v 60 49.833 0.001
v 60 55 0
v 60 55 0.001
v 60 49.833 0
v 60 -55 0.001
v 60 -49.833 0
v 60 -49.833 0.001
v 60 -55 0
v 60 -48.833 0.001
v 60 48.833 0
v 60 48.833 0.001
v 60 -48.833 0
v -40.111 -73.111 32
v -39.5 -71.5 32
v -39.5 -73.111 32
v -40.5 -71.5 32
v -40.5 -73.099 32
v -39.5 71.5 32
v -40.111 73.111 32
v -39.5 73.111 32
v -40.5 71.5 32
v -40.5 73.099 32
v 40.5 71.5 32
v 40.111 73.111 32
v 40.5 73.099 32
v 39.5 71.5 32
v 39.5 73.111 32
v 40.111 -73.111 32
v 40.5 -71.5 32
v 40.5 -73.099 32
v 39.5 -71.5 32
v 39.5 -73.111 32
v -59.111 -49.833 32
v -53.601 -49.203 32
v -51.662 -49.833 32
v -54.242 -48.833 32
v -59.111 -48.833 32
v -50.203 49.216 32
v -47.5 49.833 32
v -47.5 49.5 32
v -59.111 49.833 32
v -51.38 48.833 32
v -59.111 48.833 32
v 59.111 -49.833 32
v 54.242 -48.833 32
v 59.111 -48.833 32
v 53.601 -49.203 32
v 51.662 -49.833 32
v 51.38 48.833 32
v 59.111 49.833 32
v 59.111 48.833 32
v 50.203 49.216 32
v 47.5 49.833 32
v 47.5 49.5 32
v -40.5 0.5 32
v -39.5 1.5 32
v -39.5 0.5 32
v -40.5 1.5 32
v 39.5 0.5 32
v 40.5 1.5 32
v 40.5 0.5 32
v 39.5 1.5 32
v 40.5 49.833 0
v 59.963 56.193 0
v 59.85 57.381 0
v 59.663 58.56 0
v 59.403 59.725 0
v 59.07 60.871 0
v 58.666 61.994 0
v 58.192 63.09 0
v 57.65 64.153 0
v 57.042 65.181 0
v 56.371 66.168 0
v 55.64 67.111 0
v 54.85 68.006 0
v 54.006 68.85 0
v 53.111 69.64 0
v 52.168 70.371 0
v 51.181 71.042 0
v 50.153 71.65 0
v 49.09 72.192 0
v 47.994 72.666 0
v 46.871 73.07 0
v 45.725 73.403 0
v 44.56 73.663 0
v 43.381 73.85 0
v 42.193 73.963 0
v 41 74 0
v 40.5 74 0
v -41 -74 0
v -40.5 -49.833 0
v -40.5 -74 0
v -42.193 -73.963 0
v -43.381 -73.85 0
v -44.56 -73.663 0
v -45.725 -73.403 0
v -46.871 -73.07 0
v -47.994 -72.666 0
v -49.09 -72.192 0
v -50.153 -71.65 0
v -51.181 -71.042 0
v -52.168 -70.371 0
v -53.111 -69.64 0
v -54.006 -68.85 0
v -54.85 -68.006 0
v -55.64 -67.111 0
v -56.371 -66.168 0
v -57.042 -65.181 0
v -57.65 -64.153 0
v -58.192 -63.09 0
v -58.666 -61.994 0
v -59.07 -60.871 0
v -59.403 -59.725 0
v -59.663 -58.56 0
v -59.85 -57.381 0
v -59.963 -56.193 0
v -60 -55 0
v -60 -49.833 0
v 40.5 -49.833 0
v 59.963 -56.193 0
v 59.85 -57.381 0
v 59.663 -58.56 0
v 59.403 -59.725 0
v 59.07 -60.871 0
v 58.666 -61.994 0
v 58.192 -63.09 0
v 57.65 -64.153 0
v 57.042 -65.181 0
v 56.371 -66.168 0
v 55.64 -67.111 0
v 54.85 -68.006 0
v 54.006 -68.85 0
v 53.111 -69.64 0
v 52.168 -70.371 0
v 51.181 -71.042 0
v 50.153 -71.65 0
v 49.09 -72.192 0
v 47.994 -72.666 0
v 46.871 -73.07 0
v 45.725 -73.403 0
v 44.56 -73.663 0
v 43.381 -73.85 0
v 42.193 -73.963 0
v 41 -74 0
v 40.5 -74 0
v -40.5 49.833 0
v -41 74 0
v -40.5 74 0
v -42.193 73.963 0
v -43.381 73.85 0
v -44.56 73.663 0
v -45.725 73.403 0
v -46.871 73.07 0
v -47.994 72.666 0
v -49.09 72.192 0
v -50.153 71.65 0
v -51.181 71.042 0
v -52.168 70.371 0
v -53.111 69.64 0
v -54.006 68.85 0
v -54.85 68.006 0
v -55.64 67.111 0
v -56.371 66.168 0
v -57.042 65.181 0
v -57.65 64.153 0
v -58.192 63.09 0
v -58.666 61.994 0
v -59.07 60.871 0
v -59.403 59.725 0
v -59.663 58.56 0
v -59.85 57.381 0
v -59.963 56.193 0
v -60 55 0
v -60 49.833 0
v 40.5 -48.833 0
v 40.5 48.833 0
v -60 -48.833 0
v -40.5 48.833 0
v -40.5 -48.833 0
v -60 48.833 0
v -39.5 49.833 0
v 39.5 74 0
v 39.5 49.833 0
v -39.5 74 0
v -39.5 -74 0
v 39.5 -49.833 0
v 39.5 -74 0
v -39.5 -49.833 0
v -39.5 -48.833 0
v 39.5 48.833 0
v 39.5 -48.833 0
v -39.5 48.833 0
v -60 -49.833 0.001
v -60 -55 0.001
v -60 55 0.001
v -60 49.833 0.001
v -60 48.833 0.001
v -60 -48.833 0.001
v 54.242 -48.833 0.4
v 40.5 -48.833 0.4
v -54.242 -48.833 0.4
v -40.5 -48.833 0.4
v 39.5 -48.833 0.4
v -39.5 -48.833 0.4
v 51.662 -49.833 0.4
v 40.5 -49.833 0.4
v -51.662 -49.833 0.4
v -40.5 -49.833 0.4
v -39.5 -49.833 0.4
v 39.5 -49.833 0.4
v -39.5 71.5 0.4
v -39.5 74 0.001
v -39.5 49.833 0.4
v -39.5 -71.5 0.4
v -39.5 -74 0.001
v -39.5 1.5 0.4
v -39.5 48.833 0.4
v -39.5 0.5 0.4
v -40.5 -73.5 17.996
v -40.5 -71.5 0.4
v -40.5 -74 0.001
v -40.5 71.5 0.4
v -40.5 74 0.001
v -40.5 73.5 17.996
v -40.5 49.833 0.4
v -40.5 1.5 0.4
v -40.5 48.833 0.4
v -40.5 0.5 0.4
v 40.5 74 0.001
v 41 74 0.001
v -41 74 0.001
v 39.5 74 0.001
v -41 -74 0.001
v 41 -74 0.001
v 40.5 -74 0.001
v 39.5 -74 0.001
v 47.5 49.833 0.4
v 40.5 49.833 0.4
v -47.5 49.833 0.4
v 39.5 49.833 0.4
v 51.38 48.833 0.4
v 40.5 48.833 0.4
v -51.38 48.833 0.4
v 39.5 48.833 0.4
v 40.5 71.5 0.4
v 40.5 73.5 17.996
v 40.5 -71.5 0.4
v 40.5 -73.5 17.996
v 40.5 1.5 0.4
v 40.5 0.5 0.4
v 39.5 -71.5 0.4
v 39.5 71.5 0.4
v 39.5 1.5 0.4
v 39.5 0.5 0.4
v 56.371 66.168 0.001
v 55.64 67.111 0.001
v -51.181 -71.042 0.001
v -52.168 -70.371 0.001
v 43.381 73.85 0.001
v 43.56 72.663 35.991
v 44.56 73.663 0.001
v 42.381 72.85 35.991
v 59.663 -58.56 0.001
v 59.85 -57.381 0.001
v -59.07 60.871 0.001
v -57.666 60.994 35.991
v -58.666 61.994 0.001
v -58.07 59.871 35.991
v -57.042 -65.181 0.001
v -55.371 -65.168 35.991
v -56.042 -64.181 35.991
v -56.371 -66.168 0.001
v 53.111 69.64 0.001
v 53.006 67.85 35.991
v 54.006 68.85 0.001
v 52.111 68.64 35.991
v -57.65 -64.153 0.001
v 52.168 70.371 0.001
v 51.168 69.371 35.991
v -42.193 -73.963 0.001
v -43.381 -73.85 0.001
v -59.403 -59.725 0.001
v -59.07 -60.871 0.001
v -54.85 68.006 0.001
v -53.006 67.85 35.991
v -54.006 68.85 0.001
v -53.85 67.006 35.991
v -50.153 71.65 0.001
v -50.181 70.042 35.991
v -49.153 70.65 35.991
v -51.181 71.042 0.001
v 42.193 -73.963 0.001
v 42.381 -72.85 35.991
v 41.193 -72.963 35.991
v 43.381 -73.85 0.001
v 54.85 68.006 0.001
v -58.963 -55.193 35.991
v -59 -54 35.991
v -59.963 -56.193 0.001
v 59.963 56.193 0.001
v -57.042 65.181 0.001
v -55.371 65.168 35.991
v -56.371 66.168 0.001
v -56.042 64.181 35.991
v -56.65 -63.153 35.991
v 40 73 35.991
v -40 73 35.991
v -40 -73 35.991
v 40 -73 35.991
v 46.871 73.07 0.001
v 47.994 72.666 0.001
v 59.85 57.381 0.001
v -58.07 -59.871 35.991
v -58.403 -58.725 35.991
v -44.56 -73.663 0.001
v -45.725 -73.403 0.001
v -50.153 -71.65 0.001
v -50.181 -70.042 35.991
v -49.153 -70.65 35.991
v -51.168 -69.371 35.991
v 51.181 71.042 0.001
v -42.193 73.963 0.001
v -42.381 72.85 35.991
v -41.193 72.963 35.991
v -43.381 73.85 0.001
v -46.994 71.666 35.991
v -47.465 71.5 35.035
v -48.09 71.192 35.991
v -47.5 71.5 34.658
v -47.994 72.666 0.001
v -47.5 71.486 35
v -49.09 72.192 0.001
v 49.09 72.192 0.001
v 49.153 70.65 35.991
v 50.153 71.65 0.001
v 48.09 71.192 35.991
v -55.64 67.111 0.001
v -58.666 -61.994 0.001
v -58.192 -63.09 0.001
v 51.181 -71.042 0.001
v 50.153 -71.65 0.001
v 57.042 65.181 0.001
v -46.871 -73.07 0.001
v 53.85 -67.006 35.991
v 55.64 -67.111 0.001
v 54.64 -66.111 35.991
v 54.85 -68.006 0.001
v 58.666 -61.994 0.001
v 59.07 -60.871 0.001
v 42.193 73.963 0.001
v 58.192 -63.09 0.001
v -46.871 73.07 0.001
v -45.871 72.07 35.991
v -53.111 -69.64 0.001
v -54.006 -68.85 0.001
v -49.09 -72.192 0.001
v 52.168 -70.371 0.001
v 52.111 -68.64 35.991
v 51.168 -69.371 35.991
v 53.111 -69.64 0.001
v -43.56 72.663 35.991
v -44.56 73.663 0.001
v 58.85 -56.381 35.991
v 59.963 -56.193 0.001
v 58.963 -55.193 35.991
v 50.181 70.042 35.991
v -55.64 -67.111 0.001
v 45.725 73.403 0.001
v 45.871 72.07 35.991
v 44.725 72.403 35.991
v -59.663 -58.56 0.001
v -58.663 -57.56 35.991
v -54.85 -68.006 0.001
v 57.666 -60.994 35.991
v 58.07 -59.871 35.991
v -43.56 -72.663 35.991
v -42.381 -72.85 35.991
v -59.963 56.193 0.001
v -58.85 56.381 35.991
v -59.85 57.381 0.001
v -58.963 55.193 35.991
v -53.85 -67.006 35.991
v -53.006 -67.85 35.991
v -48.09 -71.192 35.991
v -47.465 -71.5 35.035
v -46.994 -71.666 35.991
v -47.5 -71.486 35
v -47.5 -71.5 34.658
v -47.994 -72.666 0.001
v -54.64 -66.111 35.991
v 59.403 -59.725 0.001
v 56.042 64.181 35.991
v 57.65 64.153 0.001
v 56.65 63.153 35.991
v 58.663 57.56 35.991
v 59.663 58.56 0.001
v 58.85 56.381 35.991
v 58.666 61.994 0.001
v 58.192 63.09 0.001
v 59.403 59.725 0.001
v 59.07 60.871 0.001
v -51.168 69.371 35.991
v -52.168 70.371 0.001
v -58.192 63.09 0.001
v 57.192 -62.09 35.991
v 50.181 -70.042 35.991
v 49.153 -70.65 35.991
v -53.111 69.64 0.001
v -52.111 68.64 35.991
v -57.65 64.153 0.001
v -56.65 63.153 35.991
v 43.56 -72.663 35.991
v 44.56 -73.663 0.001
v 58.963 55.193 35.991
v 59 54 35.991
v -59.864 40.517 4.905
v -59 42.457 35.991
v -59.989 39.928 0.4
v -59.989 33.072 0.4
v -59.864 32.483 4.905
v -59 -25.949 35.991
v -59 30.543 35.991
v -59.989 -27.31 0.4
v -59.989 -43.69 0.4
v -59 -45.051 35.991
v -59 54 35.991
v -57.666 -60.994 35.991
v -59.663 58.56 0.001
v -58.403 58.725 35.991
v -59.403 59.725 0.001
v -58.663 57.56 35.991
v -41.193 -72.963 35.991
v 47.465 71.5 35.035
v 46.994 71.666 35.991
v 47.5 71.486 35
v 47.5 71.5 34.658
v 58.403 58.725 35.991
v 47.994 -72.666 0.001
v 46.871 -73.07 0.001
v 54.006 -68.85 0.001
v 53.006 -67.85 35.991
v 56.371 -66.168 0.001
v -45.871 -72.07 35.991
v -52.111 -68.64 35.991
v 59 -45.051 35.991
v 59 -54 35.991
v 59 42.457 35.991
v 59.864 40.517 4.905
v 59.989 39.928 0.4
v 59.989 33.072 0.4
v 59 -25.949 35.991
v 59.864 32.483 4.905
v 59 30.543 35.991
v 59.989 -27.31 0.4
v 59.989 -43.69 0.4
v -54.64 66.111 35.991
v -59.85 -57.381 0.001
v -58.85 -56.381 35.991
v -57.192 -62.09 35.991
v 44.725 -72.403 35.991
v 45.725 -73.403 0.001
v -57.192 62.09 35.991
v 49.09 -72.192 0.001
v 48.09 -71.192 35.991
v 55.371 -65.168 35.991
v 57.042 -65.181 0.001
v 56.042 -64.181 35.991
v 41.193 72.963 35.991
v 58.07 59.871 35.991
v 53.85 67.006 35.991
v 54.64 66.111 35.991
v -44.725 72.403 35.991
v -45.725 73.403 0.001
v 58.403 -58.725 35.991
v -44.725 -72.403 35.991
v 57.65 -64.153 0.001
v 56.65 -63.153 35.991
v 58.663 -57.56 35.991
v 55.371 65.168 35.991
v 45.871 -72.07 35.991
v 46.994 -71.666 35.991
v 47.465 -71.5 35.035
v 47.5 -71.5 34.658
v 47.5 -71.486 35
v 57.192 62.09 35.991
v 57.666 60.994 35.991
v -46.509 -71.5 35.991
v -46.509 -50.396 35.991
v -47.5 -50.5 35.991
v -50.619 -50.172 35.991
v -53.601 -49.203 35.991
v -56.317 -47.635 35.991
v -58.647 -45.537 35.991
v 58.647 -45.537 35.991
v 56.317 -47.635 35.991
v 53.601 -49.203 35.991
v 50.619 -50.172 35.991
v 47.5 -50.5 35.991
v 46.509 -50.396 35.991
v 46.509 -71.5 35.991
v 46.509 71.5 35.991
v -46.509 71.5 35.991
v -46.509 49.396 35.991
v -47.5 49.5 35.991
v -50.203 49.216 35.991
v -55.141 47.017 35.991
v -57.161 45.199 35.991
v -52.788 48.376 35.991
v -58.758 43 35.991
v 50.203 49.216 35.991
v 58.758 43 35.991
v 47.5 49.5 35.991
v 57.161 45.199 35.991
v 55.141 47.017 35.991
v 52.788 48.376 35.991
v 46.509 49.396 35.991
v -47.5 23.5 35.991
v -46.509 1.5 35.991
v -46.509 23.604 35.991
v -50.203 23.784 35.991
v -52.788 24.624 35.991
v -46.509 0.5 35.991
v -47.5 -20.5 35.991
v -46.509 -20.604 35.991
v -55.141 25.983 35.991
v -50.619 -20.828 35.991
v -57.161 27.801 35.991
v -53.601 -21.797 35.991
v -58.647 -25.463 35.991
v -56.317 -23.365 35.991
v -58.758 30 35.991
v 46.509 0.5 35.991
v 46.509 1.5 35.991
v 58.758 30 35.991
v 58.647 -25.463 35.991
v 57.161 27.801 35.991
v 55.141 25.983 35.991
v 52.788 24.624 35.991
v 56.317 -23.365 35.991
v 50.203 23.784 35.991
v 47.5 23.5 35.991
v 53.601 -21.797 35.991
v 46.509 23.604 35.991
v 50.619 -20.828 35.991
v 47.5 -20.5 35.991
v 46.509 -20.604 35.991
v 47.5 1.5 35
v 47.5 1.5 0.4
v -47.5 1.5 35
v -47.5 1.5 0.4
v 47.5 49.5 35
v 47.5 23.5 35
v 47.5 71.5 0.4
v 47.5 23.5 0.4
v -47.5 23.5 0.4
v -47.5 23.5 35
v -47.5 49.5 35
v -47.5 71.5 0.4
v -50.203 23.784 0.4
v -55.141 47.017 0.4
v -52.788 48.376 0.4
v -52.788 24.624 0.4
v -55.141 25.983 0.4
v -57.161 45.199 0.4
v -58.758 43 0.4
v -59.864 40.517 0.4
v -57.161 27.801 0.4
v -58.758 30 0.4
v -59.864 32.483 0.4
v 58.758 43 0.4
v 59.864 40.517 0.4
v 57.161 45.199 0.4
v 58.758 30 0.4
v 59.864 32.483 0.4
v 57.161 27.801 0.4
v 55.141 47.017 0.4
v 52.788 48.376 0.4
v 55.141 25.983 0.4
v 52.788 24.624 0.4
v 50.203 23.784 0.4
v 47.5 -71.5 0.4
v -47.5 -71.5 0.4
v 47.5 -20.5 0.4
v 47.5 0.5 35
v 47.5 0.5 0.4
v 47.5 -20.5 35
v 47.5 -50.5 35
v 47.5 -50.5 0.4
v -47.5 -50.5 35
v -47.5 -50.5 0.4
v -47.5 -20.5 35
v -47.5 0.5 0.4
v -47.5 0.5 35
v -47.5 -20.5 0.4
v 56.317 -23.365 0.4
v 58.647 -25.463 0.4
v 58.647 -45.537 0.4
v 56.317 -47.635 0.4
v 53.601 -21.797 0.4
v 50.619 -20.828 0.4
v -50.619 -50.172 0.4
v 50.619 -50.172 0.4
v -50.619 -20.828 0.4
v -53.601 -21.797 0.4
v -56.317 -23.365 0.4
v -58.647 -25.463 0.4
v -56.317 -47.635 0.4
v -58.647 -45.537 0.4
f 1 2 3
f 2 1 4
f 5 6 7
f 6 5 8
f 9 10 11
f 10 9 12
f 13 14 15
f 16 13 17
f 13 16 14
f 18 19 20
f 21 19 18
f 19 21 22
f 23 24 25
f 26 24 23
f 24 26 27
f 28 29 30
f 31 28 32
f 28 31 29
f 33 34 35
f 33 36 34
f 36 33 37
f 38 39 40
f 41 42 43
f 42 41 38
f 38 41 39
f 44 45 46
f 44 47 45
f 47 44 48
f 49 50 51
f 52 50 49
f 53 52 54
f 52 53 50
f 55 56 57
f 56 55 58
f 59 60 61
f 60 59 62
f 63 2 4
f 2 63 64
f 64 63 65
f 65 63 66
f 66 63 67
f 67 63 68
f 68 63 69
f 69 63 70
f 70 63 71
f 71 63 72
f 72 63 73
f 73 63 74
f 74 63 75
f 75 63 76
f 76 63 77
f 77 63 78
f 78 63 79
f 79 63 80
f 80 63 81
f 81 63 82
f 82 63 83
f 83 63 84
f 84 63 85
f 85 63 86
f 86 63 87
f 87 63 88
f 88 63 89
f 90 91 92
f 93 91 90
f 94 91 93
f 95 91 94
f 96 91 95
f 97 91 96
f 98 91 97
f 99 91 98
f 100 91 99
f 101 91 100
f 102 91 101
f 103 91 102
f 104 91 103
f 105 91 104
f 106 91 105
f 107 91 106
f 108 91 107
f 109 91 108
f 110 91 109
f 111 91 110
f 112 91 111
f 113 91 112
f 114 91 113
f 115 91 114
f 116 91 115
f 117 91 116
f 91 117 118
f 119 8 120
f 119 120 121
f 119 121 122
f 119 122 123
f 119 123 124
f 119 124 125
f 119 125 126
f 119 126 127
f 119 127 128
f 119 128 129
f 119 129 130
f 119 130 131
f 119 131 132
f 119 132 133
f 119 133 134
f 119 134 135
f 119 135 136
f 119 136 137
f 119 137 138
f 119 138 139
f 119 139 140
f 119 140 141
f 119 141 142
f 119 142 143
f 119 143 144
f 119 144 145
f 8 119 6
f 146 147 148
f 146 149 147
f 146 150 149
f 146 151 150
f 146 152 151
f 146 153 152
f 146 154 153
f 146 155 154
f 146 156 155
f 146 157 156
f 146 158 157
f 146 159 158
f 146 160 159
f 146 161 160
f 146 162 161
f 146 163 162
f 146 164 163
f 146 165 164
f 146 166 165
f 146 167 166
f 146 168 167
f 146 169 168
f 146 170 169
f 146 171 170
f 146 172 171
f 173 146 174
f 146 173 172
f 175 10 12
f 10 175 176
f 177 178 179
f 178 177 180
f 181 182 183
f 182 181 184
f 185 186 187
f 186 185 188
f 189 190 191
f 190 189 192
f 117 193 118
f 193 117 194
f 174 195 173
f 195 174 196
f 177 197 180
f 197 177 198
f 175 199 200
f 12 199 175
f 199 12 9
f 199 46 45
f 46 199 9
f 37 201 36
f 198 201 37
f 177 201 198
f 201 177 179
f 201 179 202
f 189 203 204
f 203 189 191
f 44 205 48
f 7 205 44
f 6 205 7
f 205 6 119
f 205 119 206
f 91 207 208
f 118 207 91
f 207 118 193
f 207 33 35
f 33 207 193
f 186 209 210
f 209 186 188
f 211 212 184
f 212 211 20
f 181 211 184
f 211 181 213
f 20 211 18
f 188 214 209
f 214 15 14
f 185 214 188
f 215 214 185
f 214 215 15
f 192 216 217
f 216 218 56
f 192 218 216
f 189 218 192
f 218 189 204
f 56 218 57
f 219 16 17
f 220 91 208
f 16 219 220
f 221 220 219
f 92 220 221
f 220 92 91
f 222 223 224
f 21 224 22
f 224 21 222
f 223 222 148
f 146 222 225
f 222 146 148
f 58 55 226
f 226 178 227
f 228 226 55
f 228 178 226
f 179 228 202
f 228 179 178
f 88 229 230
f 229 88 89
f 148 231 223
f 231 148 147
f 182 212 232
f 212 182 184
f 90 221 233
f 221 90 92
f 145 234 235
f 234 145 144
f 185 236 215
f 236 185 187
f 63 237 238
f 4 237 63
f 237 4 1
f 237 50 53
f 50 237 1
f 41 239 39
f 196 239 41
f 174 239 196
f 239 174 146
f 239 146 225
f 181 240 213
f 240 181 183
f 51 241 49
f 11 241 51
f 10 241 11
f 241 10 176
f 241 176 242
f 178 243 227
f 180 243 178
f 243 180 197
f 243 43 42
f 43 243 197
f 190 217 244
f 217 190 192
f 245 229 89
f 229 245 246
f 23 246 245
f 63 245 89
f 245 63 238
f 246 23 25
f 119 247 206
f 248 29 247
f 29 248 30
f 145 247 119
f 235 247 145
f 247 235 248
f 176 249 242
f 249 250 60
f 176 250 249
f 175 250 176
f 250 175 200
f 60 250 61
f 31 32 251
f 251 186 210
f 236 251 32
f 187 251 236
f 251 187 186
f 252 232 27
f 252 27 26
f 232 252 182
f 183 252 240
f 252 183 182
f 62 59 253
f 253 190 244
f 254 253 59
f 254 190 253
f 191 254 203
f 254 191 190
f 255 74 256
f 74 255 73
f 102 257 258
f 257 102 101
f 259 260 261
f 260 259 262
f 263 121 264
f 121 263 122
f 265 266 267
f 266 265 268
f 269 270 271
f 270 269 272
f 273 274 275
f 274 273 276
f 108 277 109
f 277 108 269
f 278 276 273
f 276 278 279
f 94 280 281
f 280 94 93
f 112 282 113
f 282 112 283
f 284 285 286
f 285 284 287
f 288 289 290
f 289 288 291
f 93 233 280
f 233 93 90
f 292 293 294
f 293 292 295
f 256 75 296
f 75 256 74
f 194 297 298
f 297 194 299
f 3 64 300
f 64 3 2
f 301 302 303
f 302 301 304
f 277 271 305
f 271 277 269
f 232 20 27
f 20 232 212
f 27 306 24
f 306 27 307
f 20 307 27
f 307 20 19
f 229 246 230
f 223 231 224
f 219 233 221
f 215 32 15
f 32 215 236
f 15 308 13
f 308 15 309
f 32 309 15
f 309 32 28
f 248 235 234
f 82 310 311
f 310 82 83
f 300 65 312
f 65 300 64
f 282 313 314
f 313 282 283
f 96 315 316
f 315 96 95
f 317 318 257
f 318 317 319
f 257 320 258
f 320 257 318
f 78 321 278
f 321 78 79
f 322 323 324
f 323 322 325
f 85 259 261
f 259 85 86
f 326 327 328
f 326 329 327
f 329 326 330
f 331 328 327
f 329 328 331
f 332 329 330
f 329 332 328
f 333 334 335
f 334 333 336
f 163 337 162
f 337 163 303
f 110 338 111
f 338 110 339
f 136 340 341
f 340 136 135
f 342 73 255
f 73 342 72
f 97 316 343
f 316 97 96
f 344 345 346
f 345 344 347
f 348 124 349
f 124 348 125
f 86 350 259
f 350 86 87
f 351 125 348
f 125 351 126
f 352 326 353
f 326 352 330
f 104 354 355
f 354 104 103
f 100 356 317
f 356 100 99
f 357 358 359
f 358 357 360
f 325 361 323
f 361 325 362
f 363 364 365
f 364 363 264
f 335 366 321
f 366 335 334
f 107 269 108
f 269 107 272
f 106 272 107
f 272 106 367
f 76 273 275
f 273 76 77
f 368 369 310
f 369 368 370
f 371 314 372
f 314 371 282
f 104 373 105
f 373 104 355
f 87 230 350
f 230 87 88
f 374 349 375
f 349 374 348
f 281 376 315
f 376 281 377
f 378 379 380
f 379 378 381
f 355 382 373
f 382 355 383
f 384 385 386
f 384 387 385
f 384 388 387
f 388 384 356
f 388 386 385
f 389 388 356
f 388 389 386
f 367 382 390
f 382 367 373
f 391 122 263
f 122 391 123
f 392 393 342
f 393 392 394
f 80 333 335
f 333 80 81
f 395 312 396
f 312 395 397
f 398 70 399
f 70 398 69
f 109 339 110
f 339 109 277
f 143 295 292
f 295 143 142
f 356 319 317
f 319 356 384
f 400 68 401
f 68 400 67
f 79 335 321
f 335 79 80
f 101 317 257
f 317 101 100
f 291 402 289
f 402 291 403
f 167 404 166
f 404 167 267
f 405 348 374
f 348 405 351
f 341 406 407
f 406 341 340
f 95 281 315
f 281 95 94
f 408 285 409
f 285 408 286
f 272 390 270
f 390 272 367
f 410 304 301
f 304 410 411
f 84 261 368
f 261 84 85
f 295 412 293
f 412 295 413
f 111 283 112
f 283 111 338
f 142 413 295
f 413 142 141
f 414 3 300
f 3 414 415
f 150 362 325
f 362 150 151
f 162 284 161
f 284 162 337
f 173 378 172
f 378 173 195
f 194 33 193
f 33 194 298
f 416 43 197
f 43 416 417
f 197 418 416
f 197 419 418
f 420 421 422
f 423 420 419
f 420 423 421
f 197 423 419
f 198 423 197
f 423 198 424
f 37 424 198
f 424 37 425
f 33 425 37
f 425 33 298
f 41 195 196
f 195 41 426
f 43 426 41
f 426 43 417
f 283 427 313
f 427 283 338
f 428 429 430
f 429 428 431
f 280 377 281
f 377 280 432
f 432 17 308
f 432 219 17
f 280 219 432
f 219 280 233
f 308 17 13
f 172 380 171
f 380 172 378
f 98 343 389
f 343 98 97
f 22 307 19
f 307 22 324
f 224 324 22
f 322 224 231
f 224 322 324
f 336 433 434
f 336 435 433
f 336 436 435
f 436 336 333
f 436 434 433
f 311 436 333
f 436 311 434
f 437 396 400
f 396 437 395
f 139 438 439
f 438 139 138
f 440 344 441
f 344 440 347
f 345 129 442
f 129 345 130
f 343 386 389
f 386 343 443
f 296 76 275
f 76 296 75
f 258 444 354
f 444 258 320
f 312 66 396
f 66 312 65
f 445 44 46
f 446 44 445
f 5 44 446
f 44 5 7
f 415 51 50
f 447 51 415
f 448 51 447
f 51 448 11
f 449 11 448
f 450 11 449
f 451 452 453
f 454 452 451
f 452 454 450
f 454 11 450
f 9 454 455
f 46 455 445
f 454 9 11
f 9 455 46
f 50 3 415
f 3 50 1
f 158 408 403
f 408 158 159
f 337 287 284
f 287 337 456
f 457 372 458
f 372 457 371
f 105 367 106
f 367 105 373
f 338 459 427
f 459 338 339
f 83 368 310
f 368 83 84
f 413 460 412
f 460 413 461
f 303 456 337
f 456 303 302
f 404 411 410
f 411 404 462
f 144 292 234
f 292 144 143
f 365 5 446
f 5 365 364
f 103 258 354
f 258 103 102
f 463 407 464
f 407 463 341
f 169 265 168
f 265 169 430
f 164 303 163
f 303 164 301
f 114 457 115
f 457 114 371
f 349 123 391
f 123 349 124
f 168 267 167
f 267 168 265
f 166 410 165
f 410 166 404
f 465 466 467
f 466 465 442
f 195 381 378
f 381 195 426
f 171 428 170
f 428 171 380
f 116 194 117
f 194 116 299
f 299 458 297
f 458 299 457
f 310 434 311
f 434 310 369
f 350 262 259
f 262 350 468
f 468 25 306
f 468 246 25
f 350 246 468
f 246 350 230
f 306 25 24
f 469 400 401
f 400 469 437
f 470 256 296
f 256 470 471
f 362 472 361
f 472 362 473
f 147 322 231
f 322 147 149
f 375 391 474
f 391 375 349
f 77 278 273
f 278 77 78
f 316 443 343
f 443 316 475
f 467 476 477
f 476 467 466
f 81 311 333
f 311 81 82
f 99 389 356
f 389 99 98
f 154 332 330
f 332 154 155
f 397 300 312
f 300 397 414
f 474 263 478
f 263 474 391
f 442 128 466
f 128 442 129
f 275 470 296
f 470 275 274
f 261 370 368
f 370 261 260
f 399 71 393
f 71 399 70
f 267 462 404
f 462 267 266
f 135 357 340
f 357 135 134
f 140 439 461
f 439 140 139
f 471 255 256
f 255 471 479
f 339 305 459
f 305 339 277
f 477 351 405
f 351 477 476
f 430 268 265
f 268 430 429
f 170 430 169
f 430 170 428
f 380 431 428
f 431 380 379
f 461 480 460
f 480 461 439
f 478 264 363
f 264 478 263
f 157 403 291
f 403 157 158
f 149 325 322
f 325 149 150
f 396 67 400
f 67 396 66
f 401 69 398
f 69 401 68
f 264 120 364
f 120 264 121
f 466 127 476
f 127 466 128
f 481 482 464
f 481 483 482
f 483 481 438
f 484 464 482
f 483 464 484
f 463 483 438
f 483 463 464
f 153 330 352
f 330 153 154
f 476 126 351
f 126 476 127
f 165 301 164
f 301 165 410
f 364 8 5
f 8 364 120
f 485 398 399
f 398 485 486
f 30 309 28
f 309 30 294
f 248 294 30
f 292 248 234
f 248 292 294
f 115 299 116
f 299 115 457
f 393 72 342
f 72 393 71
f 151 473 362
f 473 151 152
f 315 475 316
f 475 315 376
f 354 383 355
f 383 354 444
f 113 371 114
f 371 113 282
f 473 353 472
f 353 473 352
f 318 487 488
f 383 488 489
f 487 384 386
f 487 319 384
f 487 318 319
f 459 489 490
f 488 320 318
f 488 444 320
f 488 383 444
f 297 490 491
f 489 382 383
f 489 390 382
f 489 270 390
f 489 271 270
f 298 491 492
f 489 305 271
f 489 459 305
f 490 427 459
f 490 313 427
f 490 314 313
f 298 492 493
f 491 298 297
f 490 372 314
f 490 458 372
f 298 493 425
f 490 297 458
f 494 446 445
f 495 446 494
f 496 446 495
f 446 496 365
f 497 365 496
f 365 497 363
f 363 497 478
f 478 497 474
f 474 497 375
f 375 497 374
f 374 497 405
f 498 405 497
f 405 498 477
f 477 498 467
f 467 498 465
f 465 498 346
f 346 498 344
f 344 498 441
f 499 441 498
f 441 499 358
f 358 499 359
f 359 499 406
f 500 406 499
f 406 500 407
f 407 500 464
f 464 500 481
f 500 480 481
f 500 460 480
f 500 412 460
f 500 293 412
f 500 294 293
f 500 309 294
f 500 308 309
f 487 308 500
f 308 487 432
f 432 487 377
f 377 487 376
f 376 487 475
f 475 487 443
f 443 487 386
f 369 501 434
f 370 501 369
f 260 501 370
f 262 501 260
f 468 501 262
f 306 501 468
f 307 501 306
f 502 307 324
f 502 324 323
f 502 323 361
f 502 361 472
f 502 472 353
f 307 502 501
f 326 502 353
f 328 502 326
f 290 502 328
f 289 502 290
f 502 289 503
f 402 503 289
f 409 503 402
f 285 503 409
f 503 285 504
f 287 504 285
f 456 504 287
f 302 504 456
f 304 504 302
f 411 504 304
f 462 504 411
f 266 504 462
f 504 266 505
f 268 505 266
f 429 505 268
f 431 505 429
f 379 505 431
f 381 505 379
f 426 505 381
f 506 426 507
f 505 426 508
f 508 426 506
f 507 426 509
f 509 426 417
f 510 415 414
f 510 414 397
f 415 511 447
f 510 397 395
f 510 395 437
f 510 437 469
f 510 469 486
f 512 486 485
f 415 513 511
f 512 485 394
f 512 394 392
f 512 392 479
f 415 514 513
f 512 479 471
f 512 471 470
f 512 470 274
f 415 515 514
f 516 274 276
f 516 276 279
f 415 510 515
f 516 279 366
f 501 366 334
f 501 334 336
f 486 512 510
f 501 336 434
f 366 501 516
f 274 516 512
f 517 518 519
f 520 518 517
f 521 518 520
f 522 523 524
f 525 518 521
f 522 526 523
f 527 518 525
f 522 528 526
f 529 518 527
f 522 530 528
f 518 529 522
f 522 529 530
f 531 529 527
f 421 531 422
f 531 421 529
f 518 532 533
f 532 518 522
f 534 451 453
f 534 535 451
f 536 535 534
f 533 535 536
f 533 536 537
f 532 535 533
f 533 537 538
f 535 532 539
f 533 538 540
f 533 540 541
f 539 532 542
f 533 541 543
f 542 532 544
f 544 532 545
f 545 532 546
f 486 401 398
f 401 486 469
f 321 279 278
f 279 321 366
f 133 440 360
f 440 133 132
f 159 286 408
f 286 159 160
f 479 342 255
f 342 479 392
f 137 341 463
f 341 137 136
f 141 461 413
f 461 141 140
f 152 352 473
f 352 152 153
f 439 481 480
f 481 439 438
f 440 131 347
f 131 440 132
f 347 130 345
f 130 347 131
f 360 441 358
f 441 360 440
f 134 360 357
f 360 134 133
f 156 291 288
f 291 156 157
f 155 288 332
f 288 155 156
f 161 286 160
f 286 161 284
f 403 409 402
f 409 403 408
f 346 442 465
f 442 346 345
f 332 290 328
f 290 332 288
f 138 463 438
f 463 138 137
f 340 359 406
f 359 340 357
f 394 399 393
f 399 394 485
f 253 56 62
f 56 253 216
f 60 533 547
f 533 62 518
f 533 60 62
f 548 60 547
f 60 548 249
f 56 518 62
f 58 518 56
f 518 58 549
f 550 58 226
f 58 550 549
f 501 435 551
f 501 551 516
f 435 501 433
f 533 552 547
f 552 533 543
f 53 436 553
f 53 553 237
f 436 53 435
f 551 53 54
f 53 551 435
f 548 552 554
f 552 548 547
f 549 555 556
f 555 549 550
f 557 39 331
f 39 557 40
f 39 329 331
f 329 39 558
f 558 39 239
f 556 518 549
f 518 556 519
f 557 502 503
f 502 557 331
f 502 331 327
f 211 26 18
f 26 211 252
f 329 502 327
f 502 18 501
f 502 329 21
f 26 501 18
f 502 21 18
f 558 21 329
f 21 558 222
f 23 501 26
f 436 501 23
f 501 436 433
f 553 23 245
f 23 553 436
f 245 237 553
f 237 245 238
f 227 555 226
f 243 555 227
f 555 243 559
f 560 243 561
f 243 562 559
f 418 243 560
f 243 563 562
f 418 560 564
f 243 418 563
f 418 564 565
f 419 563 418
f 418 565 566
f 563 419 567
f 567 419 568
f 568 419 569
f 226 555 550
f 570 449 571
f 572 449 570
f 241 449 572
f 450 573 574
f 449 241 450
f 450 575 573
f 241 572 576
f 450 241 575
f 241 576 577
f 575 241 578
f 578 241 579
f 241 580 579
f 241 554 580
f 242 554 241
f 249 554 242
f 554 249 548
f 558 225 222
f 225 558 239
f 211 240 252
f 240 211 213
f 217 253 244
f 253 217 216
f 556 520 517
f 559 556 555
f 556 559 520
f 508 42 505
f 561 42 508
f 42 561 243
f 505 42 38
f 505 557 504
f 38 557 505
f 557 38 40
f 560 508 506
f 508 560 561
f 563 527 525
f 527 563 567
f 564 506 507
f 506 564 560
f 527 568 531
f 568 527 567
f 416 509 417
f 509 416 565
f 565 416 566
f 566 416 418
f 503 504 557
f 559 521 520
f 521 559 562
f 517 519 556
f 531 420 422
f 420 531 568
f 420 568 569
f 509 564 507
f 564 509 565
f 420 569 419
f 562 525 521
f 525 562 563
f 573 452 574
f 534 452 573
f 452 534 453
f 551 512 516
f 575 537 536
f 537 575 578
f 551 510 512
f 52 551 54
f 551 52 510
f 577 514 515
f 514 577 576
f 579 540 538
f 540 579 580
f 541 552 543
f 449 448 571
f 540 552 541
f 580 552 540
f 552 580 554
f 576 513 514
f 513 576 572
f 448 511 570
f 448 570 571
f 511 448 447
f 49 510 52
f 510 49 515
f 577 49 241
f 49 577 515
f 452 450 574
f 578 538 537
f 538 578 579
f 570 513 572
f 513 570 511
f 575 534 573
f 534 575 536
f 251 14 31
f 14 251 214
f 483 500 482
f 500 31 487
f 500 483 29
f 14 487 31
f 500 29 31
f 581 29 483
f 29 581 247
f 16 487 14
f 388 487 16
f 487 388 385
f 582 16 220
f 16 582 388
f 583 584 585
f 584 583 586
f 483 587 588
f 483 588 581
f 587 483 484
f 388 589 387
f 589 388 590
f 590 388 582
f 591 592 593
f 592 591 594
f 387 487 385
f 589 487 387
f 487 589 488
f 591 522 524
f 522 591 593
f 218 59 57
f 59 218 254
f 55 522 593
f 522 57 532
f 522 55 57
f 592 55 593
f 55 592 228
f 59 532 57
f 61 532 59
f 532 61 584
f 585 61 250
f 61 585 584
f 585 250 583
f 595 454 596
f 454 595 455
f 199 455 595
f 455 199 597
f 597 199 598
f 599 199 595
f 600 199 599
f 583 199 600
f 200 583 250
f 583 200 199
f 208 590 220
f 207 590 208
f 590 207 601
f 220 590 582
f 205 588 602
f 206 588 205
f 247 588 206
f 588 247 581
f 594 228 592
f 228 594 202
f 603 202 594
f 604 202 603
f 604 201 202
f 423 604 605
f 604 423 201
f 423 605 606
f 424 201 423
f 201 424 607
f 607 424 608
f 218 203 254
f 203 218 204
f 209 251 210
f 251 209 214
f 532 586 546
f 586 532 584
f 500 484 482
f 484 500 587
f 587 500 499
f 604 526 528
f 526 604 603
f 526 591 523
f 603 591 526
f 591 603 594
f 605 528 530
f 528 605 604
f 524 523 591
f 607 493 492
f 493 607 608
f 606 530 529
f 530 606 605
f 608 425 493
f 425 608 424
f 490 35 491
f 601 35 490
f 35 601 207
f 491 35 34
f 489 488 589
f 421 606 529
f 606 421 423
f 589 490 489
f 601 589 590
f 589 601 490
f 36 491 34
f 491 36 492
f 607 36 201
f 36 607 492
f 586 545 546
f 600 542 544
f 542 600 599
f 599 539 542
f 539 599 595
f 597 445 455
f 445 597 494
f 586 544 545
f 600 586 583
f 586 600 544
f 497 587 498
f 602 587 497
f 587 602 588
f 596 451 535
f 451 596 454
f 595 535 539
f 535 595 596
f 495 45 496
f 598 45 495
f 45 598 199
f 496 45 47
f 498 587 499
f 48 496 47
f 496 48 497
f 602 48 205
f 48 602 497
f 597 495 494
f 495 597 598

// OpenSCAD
include <BOSL/constants.scad>
use <BOSL/shapes.scad>

w1=120;
l1=148;

w2=118;
l2=146;

h=36;
r=19;

h_to_b=h-4;

module outer_body() {
    difference() {
        rounded_prismoid(size1=[w1, l1], size2=[w2, l2], h=h, r1=r, r2=r, $fn=100);
        //rounded_prismoid(size1=[w1-4, l1-4], size2=[w2-10, l2-10], h=h_to_b, r1=r, r2=r, $fn=100);
        
        for(i=[-1/3 : 2/3 : 1/3]) {
            translate([0, i*l1, (h_to_b)/2]) cube([w1, 1, h_to_b], center=true);
            translate([i*w1, 0, (h_to_b)/2]) cube([1, l1, h_to_b], center=true);
        }
    }
}

module inner_body() {
    // todo maybe from cards_hole?
    hull() {
        translate([0,0, h_to_b]) rounded_prismoid(size1=[w2-10, l2-10], size2=[w2-10, l2-10], h=1, r1=r, r2=r, $fn=100);
    cards_hole(2, 2);
    }
}

module cards_hole(delta_w = 0, delta_l = 0) {
    hole_w=70+delta_w;
    hole_l=95+delta_l;
    hole_h=h-0.4;
    
    finger_hole_r=13+delta_w;
    
    hull() {
         translate([0,0,hole_h-0.1]) cuboid([hole_w,hole_l-2,0.1], align=V_UP);
         cuboid([hole_w,hole_l,hole_h-1], align=V_UP);
    }
    translate([0, hole_l/2, 0]) cylinder(h=hole_h, r=finger_hole_r);
    translate([0, -hole_l/2, 0]) cylinder(h=hole_h, r=finger_hole_r);
}

module single() {
    difference() {
        union() {
            outer_body();
            inner_body();
        }
        translate([0,0,0.4]) cards_hole();
    }
}

module double() {
    difference() {
        union() {
            outer_body();
        }
        translate([0, 36.5, 0.4]) rotate([0,0, 90]) cards_hole();
        translate([0, -35.5, 0.4]) rotate([0,0, 90]) cards_hole(2);
    }
}

double();
